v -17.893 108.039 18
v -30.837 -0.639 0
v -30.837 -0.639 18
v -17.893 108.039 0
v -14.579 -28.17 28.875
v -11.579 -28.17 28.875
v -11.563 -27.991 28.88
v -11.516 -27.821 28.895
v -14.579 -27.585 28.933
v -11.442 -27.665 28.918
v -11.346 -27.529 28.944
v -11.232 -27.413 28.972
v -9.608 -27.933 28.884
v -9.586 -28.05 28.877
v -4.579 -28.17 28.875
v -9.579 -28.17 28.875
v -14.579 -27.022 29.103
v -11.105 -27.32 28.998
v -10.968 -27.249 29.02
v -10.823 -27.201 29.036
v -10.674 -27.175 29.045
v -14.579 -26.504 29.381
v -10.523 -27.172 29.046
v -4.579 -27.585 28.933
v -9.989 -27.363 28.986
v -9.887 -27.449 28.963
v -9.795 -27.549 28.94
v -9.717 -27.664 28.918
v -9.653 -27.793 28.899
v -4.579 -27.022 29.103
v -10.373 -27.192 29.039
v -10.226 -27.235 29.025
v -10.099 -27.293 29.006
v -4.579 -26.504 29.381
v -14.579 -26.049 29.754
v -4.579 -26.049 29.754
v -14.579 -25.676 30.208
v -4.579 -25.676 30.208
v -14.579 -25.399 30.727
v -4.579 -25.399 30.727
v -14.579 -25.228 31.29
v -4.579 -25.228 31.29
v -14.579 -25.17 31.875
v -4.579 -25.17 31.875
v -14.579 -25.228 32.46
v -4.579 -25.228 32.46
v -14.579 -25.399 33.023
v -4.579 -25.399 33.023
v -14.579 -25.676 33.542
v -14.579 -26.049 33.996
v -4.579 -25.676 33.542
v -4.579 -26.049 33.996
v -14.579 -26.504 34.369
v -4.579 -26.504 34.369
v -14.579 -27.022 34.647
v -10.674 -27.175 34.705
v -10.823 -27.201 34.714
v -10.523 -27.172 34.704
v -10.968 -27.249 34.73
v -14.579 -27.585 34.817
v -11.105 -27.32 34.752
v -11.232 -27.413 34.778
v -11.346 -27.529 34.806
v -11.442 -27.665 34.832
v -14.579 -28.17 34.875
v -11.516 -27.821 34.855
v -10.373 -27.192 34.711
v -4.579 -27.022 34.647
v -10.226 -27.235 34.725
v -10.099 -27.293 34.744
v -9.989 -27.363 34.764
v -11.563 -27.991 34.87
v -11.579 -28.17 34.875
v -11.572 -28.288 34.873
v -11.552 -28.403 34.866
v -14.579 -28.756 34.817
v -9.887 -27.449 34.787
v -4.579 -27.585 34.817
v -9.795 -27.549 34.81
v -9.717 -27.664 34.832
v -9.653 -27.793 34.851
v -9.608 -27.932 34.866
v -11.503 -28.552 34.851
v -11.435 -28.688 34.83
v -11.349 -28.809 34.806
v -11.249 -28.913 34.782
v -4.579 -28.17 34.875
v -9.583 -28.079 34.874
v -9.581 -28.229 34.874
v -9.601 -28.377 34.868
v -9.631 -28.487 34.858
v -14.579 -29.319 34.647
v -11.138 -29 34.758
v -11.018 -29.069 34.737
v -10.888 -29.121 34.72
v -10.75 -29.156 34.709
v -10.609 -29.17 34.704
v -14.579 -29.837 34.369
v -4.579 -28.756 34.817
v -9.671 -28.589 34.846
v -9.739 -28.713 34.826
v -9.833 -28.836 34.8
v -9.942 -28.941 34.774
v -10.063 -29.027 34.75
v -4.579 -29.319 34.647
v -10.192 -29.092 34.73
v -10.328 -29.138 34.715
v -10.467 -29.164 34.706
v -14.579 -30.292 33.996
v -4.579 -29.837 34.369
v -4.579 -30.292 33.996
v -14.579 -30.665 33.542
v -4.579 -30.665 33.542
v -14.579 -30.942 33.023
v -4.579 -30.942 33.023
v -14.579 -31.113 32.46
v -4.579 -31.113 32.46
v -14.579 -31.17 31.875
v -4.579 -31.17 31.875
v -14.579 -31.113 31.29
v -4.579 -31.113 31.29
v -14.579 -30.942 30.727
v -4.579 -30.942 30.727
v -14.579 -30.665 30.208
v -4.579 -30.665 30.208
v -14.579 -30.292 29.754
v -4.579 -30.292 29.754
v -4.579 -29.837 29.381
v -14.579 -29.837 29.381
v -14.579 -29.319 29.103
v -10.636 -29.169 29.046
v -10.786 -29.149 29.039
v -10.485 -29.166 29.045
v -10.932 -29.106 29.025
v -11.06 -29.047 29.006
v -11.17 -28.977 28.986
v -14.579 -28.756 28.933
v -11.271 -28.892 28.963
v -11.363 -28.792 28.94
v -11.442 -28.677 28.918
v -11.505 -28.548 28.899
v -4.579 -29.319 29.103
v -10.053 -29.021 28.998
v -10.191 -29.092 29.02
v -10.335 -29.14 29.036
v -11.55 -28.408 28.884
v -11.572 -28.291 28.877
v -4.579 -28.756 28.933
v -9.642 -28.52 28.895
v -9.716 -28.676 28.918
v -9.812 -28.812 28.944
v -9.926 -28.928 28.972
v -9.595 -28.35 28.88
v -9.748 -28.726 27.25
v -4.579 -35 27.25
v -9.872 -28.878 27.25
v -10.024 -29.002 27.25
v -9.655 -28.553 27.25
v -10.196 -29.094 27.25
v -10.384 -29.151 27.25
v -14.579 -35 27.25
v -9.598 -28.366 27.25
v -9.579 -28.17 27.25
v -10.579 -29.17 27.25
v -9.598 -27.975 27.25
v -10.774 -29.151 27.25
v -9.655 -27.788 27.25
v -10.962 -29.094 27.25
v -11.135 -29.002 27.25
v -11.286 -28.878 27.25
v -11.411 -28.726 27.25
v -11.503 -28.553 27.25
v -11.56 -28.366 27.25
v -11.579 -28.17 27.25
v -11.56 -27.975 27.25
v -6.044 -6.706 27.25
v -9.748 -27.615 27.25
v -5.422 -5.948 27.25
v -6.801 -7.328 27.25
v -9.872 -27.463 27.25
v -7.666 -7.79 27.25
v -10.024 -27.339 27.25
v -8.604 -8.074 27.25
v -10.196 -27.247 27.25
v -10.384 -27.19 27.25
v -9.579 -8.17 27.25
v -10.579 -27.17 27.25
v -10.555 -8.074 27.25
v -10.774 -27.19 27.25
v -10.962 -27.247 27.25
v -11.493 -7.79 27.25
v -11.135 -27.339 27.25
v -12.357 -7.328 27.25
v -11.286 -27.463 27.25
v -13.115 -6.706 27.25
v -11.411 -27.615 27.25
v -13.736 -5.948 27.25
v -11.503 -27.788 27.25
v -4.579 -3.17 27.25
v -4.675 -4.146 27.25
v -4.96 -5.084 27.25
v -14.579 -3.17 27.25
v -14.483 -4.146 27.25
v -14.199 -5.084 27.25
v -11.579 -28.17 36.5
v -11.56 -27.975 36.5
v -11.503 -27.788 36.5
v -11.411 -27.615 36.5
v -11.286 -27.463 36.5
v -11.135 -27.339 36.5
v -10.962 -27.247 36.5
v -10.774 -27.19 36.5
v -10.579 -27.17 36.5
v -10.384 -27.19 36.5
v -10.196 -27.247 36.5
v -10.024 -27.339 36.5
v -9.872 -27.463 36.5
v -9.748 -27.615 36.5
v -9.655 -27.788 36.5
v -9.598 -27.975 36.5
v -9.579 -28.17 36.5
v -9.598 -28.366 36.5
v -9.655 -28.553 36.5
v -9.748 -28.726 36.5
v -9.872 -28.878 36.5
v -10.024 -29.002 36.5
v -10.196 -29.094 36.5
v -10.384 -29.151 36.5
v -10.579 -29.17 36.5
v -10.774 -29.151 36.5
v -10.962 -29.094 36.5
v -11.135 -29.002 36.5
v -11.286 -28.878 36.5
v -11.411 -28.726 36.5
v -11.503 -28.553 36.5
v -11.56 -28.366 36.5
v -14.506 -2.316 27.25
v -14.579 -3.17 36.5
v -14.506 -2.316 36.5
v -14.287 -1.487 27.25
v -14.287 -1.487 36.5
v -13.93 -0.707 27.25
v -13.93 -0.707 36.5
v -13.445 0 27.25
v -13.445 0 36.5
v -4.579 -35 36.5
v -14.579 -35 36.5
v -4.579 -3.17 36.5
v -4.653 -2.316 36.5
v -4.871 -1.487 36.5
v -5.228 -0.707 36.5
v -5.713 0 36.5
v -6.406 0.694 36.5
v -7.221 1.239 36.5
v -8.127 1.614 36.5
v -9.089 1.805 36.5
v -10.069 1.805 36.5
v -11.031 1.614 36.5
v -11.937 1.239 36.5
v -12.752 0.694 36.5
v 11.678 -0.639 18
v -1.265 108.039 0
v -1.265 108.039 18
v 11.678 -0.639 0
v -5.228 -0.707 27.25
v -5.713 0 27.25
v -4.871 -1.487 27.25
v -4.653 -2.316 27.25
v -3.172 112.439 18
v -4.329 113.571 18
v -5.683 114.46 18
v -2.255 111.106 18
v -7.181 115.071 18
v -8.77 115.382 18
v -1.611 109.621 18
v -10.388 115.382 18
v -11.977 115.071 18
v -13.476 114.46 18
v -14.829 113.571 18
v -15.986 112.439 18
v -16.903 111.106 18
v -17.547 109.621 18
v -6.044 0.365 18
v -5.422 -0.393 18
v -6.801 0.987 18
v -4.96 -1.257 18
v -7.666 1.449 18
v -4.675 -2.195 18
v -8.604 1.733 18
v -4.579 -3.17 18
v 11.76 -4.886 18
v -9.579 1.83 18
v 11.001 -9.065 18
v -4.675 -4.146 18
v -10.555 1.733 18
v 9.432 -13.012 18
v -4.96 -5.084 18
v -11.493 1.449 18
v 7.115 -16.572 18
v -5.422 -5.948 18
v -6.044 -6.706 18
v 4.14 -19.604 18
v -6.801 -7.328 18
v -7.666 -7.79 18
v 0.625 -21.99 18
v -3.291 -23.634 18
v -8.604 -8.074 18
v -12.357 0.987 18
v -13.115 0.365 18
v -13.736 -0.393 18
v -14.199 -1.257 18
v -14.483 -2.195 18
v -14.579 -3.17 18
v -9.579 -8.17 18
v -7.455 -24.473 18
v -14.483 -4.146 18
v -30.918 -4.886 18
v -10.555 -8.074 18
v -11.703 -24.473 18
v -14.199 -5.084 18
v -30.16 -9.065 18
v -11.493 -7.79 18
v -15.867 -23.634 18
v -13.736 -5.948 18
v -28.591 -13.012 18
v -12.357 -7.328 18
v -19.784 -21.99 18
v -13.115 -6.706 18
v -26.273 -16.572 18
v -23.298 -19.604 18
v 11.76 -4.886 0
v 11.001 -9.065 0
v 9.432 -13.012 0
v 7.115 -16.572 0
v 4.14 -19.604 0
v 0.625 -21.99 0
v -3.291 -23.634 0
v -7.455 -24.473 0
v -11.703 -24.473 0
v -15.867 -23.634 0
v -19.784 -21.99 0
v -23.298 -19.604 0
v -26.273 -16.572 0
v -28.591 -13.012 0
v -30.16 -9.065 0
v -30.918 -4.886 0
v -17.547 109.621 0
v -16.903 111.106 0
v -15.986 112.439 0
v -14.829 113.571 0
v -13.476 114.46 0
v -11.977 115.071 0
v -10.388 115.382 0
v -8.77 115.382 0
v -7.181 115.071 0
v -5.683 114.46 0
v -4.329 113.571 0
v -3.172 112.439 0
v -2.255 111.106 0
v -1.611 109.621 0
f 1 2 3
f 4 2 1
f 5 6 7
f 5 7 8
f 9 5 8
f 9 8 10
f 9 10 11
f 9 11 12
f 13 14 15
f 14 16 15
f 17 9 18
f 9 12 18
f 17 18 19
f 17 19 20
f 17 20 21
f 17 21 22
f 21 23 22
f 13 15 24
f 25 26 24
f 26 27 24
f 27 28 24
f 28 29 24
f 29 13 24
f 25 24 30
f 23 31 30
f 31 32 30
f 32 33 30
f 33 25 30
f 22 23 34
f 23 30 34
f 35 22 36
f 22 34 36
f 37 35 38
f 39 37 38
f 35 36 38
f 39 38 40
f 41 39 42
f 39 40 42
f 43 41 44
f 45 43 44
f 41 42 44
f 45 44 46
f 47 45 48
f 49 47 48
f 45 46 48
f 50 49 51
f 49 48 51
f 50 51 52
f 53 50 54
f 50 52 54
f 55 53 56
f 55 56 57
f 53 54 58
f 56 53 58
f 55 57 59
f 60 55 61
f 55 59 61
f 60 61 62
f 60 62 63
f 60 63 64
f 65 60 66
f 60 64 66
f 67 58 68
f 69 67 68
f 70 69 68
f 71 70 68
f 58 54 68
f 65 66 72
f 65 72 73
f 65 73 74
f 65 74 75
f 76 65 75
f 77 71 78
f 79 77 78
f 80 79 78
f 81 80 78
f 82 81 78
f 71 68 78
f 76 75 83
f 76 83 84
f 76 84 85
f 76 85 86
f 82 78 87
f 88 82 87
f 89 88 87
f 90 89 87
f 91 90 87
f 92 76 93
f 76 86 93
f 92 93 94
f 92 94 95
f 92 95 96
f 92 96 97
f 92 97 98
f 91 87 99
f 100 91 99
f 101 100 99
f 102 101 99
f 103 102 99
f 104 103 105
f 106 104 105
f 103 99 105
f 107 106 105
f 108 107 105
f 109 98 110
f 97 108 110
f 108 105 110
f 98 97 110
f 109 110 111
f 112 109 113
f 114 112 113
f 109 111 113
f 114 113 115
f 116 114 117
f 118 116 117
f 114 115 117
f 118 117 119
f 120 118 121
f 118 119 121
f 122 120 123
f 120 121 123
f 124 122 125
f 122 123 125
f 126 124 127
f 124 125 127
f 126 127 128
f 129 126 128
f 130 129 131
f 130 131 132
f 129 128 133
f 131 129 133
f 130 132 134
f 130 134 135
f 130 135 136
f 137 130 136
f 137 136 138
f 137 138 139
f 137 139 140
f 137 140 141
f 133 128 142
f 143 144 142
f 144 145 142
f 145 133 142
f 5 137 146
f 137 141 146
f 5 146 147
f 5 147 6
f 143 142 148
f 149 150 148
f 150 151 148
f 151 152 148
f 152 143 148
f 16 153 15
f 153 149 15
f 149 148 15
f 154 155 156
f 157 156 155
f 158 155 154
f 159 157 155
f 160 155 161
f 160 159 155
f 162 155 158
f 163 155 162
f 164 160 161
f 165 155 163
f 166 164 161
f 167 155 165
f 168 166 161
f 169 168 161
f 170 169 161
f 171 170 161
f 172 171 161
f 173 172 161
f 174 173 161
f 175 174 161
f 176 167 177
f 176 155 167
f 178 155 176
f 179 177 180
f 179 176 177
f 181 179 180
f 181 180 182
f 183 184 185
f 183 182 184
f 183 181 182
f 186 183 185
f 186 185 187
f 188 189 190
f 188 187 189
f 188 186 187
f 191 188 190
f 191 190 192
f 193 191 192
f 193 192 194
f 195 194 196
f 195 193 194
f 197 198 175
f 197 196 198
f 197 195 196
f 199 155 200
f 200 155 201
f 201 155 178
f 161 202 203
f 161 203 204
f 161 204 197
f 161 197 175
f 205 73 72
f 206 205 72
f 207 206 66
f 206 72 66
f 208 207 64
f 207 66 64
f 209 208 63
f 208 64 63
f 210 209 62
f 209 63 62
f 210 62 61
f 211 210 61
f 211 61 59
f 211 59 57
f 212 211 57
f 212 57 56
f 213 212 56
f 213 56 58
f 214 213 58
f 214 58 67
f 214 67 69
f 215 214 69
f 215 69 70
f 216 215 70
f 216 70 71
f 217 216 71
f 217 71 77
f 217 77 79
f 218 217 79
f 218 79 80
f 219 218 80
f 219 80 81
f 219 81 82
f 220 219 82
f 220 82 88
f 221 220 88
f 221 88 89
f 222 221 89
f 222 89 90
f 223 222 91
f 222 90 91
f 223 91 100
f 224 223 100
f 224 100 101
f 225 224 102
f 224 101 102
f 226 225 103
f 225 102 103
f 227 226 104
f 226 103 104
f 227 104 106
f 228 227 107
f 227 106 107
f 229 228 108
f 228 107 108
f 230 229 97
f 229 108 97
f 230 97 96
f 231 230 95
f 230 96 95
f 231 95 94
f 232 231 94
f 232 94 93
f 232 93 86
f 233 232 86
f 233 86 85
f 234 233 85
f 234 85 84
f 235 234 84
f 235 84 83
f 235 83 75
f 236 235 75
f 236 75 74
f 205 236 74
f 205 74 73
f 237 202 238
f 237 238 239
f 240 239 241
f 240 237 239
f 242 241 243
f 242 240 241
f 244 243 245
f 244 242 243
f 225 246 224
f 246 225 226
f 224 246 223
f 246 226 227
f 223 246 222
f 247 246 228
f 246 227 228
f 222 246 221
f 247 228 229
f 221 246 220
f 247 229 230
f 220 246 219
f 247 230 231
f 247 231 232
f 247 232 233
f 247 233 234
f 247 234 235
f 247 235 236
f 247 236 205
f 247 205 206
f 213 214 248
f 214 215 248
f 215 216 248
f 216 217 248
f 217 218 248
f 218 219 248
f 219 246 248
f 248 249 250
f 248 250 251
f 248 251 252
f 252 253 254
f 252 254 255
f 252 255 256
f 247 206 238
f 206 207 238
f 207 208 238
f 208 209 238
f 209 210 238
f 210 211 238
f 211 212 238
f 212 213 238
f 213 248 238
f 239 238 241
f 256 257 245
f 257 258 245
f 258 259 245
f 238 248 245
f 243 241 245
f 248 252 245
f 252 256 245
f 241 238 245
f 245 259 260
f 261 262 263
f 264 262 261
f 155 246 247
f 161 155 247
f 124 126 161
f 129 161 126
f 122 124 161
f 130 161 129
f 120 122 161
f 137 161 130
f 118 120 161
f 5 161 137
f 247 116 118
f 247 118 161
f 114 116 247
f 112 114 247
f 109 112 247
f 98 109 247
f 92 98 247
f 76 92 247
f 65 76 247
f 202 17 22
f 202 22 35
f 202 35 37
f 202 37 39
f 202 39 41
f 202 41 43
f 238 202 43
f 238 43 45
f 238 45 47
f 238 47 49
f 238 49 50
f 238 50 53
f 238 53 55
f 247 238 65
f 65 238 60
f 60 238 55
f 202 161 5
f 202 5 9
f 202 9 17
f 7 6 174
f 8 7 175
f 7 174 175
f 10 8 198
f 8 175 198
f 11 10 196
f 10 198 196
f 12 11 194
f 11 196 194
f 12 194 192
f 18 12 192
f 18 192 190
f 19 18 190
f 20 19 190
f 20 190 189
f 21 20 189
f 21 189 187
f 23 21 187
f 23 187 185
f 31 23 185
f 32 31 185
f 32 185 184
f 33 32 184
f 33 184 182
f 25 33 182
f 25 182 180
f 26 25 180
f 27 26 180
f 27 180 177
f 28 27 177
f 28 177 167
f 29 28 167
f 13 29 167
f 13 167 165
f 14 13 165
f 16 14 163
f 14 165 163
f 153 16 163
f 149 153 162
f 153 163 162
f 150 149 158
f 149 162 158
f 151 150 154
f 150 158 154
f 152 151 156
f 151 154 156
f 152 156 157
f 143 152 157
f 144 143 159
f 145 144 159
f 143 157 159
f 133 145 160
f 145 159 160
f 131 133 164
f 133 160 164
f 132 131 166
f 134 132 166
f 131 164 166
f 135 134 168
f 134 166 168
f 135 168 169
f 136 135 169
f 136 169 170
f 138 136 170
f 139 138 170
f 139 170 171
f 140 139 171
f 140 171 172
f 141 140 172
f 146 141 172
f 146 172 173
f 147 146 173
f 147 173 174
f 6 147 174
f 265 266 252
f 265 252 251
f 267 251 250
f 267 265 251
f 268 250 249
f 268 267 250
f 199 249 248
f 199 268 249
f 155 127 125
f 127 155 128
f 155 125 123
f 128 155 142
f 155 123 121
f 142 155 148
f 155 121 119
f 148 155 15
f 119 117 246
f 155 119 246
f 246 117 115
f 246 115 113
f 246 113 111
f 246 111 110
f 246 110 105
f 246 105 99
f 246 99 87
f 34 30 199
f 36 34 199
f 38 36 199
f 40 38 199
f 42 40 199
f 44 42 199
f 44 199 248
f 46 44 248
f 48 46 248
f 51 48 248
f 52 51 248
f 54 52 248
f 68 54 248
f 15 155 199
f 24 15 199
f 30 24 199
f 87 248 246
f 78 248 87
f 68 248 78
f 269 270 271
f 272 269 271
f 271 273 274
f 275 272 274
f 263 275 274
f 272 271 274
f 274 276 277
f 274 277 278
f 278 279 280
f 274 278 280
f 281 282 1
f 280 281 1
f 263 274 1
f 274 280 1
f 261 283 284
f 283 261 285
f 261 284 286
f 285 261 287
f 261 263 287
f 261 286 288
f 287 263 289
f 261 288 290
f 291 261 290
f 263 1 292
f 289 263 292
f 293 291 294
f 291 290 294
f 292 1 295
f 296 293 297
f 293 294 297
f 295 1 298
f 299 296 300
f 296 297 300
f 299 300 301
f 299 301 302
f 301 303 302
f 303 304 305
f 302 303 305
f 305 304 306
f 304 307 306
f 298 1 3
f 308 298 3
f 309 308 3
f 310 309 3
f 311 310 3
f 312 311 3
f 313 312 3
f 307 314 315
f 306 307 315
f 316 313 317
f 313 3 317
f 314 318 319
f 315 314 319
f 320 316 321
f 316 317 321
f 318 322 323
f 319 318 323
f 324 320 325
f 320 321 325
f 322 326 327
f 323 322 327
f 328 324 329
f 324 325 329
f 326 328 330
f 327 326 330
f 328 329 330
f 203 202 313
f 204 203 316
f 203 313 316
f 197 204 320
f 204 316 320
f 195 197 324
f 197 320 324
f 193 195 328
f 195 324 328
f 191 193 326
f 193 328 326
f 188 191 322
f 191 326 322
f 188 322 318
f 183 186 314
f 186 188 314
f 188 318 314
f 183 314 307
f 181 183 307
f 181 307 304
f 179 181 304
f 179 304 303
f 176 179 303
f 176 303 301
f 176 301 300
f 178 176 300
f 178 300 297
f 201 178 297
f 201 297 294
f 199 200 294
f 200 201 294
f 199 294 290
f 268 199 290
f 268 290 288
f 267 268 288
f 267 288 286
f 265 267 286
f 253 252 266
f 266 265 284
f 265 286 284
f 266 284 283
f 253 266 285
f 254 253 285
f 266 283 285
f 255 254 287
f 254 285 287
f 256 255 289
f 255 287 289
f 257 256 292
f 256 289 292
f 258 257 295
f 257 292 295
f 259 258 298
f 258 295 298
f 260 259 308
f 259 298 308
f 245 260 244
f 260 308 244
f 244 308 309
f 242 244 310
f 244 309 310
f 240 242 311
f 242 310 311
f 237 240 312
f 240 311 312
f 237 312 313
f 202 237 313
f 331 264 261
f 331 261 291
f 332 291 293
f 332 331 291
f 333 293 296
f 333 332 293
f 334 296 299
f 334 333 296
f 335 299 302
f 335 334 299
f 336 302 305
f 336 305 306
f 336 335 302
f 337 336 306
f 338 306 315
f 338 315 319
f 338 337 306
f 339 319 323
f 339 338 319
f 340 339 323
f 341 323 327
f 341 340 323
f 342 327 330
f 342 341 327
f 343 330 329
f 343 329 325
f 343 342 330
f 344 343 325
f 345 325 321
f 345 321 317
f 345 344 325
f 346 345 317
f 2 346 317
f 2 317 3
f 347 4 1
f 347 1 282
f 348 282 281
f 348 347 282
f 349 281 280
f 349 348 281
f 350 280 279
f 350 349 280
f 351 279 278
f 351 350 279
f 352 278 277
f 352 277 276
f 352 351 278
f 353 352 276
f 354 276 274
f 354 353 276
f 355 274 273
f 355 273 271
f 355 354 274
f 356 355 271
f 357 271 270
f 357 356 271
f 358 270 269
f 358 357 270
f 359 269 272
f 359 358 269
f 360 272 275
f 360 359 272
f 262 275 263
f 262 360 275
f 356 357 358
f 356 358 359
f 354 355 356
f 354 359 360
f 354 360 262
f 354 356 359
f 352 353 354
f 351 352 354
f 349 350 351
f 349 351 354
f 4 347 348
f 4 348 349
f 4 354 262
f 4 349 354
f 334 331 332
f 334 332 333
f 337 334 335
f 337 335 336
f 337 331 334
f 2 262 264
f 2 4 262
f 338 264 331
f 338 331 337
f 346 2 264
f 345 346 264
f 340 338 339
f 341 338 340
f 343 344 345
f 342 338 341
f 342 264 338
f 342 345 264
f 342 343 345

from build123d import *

# Parameters (mm, degrees)
BOSS_EXTRUDE1_DEPTH = 18
SKETCH2_R           = 5
BOSS_EXTRUDE2_DEPTH = 18.5
SKETCH3_W           = 10
SKETCH3_H           = 9.25
BOSS_EXTRUDE3_DEPTH = 35
DELETEFACE1_START   = 27.25
DELETEFACE1_DEPTH   = 9.25
SKETCH4_R           = 3
CUT_EXTRUDE1_DEPTH  = 124.902325662
SKETCH5_R           = 1
CUT_EXTRUDE4_DEPTH  = 123.576174145


# Read off the part's stored shape, not the designer's step: DeleteFace1
with BuildPart() as part:
    # Sketch1 → Boss-Extrude1 (new body)
    with BuildSketch(Plane(origin=(0, 0, 0), x_dir=(0, 1, 0), z_dir=(0, 0, 1))):
        with BuildLine():
            Line((-0.63860975, 30.836781145), (108.03933208, 17.892911363))
            ThreePointArc((108.03933208, 17.892911363), (115.421662674, 9.579146253), (108.03933208, 1.265381143))
            Line((108.03933208, 1.265381143), (-0.63860975, -11.678488639))
            ThreePointArc((-0.63860975, -11.678488639), (-24.578337326, 9.579146253), (-0.63860975, 30.836781145))
        make_face()
    extrude(amount=BOSS_EXTRUDE1_DEPTH)

    # Sketch2 → Boss-Extrude2 (add)
    with BuildSketch(Plane.XY.offset(18)):
        with Locations(Location((-9.579146253, -3.17045801, 0), (0, 0, 180))):
            Circle(SKETCH2_R)
    extrude(amount=BOSS_EXTRUDE2_DEPTH)

    # Sketch3 → Boss-Extrude3 (add)
    with BuildSketch(Plane(origin=(0, 0, 0), x_dir=(-1, 0, 0), z_dir=(0, 1, 0))):
        with Locations((9.579146253, 31.875)):
            Rectangle(SKETCH3_W, SKETCH3_H)
    extrude(amount=-BOSS_EXTRUDE3_DEPTH)

    # DeleteFace1 outline → DeleteFace1 (cut)
    with BuildSketch(Plane.XY.offset(DELETEFACE1_START)):
        with BuildLine():
            ThreePointArc((-5.712856558, 0), (-4.871097375, -1.486927267), (-4.579146253, -3.17045801))
            Line((-4.579146253, -3.17045801), (-4.579146253, 0))
            Line((-4.579146253, 0), (-5.712856558, 0))
        make_face()
        with BuildLine():
            Line((-14.579146253, 0), (-14.579146253, -3.17045801))
            ThreePointArc((-14.579146253, -3.17045801), (-14.287195131, -1.486927267), (-13.445435948, 0))
            Line((-13.445435948, 0), (-14.579146253, 0))
        make_face()
    extrude(amount=DELETEFACE1_DEPTH, mode=Mode.SUBTRACT)

    # Sketch4 → Cut-Extrude1 (cut, through all)
    with BuildSketch(Plane.YZ.offset(-4.579146253)):
        with Locations(Location((-28.17045801, 31.875, 0), (0, 0, 270))):
            Circle(SKETCH4_R)
    extrude(amount=-CUT_EXTRUDE1_DEPTH, mode=Mode.SUBTRACT)

    # Sketch5 → Cut-Extrude4 (cut, through all)
    with BuildSketch(Plane(origin=(0, 0, 27.25), x_dir=(1, 0, 0), z_dir=(0, 0, -1))):
        with Locations(Location((-10.579146253, 28.17045801, 0), (0, 0, 180))):
            Circle(SKETCH5_R)
    extrude(amount=-CUT_EXTRUDE4_DEPTH, mode=Mode.SUBTRACT)


solid = part.part
